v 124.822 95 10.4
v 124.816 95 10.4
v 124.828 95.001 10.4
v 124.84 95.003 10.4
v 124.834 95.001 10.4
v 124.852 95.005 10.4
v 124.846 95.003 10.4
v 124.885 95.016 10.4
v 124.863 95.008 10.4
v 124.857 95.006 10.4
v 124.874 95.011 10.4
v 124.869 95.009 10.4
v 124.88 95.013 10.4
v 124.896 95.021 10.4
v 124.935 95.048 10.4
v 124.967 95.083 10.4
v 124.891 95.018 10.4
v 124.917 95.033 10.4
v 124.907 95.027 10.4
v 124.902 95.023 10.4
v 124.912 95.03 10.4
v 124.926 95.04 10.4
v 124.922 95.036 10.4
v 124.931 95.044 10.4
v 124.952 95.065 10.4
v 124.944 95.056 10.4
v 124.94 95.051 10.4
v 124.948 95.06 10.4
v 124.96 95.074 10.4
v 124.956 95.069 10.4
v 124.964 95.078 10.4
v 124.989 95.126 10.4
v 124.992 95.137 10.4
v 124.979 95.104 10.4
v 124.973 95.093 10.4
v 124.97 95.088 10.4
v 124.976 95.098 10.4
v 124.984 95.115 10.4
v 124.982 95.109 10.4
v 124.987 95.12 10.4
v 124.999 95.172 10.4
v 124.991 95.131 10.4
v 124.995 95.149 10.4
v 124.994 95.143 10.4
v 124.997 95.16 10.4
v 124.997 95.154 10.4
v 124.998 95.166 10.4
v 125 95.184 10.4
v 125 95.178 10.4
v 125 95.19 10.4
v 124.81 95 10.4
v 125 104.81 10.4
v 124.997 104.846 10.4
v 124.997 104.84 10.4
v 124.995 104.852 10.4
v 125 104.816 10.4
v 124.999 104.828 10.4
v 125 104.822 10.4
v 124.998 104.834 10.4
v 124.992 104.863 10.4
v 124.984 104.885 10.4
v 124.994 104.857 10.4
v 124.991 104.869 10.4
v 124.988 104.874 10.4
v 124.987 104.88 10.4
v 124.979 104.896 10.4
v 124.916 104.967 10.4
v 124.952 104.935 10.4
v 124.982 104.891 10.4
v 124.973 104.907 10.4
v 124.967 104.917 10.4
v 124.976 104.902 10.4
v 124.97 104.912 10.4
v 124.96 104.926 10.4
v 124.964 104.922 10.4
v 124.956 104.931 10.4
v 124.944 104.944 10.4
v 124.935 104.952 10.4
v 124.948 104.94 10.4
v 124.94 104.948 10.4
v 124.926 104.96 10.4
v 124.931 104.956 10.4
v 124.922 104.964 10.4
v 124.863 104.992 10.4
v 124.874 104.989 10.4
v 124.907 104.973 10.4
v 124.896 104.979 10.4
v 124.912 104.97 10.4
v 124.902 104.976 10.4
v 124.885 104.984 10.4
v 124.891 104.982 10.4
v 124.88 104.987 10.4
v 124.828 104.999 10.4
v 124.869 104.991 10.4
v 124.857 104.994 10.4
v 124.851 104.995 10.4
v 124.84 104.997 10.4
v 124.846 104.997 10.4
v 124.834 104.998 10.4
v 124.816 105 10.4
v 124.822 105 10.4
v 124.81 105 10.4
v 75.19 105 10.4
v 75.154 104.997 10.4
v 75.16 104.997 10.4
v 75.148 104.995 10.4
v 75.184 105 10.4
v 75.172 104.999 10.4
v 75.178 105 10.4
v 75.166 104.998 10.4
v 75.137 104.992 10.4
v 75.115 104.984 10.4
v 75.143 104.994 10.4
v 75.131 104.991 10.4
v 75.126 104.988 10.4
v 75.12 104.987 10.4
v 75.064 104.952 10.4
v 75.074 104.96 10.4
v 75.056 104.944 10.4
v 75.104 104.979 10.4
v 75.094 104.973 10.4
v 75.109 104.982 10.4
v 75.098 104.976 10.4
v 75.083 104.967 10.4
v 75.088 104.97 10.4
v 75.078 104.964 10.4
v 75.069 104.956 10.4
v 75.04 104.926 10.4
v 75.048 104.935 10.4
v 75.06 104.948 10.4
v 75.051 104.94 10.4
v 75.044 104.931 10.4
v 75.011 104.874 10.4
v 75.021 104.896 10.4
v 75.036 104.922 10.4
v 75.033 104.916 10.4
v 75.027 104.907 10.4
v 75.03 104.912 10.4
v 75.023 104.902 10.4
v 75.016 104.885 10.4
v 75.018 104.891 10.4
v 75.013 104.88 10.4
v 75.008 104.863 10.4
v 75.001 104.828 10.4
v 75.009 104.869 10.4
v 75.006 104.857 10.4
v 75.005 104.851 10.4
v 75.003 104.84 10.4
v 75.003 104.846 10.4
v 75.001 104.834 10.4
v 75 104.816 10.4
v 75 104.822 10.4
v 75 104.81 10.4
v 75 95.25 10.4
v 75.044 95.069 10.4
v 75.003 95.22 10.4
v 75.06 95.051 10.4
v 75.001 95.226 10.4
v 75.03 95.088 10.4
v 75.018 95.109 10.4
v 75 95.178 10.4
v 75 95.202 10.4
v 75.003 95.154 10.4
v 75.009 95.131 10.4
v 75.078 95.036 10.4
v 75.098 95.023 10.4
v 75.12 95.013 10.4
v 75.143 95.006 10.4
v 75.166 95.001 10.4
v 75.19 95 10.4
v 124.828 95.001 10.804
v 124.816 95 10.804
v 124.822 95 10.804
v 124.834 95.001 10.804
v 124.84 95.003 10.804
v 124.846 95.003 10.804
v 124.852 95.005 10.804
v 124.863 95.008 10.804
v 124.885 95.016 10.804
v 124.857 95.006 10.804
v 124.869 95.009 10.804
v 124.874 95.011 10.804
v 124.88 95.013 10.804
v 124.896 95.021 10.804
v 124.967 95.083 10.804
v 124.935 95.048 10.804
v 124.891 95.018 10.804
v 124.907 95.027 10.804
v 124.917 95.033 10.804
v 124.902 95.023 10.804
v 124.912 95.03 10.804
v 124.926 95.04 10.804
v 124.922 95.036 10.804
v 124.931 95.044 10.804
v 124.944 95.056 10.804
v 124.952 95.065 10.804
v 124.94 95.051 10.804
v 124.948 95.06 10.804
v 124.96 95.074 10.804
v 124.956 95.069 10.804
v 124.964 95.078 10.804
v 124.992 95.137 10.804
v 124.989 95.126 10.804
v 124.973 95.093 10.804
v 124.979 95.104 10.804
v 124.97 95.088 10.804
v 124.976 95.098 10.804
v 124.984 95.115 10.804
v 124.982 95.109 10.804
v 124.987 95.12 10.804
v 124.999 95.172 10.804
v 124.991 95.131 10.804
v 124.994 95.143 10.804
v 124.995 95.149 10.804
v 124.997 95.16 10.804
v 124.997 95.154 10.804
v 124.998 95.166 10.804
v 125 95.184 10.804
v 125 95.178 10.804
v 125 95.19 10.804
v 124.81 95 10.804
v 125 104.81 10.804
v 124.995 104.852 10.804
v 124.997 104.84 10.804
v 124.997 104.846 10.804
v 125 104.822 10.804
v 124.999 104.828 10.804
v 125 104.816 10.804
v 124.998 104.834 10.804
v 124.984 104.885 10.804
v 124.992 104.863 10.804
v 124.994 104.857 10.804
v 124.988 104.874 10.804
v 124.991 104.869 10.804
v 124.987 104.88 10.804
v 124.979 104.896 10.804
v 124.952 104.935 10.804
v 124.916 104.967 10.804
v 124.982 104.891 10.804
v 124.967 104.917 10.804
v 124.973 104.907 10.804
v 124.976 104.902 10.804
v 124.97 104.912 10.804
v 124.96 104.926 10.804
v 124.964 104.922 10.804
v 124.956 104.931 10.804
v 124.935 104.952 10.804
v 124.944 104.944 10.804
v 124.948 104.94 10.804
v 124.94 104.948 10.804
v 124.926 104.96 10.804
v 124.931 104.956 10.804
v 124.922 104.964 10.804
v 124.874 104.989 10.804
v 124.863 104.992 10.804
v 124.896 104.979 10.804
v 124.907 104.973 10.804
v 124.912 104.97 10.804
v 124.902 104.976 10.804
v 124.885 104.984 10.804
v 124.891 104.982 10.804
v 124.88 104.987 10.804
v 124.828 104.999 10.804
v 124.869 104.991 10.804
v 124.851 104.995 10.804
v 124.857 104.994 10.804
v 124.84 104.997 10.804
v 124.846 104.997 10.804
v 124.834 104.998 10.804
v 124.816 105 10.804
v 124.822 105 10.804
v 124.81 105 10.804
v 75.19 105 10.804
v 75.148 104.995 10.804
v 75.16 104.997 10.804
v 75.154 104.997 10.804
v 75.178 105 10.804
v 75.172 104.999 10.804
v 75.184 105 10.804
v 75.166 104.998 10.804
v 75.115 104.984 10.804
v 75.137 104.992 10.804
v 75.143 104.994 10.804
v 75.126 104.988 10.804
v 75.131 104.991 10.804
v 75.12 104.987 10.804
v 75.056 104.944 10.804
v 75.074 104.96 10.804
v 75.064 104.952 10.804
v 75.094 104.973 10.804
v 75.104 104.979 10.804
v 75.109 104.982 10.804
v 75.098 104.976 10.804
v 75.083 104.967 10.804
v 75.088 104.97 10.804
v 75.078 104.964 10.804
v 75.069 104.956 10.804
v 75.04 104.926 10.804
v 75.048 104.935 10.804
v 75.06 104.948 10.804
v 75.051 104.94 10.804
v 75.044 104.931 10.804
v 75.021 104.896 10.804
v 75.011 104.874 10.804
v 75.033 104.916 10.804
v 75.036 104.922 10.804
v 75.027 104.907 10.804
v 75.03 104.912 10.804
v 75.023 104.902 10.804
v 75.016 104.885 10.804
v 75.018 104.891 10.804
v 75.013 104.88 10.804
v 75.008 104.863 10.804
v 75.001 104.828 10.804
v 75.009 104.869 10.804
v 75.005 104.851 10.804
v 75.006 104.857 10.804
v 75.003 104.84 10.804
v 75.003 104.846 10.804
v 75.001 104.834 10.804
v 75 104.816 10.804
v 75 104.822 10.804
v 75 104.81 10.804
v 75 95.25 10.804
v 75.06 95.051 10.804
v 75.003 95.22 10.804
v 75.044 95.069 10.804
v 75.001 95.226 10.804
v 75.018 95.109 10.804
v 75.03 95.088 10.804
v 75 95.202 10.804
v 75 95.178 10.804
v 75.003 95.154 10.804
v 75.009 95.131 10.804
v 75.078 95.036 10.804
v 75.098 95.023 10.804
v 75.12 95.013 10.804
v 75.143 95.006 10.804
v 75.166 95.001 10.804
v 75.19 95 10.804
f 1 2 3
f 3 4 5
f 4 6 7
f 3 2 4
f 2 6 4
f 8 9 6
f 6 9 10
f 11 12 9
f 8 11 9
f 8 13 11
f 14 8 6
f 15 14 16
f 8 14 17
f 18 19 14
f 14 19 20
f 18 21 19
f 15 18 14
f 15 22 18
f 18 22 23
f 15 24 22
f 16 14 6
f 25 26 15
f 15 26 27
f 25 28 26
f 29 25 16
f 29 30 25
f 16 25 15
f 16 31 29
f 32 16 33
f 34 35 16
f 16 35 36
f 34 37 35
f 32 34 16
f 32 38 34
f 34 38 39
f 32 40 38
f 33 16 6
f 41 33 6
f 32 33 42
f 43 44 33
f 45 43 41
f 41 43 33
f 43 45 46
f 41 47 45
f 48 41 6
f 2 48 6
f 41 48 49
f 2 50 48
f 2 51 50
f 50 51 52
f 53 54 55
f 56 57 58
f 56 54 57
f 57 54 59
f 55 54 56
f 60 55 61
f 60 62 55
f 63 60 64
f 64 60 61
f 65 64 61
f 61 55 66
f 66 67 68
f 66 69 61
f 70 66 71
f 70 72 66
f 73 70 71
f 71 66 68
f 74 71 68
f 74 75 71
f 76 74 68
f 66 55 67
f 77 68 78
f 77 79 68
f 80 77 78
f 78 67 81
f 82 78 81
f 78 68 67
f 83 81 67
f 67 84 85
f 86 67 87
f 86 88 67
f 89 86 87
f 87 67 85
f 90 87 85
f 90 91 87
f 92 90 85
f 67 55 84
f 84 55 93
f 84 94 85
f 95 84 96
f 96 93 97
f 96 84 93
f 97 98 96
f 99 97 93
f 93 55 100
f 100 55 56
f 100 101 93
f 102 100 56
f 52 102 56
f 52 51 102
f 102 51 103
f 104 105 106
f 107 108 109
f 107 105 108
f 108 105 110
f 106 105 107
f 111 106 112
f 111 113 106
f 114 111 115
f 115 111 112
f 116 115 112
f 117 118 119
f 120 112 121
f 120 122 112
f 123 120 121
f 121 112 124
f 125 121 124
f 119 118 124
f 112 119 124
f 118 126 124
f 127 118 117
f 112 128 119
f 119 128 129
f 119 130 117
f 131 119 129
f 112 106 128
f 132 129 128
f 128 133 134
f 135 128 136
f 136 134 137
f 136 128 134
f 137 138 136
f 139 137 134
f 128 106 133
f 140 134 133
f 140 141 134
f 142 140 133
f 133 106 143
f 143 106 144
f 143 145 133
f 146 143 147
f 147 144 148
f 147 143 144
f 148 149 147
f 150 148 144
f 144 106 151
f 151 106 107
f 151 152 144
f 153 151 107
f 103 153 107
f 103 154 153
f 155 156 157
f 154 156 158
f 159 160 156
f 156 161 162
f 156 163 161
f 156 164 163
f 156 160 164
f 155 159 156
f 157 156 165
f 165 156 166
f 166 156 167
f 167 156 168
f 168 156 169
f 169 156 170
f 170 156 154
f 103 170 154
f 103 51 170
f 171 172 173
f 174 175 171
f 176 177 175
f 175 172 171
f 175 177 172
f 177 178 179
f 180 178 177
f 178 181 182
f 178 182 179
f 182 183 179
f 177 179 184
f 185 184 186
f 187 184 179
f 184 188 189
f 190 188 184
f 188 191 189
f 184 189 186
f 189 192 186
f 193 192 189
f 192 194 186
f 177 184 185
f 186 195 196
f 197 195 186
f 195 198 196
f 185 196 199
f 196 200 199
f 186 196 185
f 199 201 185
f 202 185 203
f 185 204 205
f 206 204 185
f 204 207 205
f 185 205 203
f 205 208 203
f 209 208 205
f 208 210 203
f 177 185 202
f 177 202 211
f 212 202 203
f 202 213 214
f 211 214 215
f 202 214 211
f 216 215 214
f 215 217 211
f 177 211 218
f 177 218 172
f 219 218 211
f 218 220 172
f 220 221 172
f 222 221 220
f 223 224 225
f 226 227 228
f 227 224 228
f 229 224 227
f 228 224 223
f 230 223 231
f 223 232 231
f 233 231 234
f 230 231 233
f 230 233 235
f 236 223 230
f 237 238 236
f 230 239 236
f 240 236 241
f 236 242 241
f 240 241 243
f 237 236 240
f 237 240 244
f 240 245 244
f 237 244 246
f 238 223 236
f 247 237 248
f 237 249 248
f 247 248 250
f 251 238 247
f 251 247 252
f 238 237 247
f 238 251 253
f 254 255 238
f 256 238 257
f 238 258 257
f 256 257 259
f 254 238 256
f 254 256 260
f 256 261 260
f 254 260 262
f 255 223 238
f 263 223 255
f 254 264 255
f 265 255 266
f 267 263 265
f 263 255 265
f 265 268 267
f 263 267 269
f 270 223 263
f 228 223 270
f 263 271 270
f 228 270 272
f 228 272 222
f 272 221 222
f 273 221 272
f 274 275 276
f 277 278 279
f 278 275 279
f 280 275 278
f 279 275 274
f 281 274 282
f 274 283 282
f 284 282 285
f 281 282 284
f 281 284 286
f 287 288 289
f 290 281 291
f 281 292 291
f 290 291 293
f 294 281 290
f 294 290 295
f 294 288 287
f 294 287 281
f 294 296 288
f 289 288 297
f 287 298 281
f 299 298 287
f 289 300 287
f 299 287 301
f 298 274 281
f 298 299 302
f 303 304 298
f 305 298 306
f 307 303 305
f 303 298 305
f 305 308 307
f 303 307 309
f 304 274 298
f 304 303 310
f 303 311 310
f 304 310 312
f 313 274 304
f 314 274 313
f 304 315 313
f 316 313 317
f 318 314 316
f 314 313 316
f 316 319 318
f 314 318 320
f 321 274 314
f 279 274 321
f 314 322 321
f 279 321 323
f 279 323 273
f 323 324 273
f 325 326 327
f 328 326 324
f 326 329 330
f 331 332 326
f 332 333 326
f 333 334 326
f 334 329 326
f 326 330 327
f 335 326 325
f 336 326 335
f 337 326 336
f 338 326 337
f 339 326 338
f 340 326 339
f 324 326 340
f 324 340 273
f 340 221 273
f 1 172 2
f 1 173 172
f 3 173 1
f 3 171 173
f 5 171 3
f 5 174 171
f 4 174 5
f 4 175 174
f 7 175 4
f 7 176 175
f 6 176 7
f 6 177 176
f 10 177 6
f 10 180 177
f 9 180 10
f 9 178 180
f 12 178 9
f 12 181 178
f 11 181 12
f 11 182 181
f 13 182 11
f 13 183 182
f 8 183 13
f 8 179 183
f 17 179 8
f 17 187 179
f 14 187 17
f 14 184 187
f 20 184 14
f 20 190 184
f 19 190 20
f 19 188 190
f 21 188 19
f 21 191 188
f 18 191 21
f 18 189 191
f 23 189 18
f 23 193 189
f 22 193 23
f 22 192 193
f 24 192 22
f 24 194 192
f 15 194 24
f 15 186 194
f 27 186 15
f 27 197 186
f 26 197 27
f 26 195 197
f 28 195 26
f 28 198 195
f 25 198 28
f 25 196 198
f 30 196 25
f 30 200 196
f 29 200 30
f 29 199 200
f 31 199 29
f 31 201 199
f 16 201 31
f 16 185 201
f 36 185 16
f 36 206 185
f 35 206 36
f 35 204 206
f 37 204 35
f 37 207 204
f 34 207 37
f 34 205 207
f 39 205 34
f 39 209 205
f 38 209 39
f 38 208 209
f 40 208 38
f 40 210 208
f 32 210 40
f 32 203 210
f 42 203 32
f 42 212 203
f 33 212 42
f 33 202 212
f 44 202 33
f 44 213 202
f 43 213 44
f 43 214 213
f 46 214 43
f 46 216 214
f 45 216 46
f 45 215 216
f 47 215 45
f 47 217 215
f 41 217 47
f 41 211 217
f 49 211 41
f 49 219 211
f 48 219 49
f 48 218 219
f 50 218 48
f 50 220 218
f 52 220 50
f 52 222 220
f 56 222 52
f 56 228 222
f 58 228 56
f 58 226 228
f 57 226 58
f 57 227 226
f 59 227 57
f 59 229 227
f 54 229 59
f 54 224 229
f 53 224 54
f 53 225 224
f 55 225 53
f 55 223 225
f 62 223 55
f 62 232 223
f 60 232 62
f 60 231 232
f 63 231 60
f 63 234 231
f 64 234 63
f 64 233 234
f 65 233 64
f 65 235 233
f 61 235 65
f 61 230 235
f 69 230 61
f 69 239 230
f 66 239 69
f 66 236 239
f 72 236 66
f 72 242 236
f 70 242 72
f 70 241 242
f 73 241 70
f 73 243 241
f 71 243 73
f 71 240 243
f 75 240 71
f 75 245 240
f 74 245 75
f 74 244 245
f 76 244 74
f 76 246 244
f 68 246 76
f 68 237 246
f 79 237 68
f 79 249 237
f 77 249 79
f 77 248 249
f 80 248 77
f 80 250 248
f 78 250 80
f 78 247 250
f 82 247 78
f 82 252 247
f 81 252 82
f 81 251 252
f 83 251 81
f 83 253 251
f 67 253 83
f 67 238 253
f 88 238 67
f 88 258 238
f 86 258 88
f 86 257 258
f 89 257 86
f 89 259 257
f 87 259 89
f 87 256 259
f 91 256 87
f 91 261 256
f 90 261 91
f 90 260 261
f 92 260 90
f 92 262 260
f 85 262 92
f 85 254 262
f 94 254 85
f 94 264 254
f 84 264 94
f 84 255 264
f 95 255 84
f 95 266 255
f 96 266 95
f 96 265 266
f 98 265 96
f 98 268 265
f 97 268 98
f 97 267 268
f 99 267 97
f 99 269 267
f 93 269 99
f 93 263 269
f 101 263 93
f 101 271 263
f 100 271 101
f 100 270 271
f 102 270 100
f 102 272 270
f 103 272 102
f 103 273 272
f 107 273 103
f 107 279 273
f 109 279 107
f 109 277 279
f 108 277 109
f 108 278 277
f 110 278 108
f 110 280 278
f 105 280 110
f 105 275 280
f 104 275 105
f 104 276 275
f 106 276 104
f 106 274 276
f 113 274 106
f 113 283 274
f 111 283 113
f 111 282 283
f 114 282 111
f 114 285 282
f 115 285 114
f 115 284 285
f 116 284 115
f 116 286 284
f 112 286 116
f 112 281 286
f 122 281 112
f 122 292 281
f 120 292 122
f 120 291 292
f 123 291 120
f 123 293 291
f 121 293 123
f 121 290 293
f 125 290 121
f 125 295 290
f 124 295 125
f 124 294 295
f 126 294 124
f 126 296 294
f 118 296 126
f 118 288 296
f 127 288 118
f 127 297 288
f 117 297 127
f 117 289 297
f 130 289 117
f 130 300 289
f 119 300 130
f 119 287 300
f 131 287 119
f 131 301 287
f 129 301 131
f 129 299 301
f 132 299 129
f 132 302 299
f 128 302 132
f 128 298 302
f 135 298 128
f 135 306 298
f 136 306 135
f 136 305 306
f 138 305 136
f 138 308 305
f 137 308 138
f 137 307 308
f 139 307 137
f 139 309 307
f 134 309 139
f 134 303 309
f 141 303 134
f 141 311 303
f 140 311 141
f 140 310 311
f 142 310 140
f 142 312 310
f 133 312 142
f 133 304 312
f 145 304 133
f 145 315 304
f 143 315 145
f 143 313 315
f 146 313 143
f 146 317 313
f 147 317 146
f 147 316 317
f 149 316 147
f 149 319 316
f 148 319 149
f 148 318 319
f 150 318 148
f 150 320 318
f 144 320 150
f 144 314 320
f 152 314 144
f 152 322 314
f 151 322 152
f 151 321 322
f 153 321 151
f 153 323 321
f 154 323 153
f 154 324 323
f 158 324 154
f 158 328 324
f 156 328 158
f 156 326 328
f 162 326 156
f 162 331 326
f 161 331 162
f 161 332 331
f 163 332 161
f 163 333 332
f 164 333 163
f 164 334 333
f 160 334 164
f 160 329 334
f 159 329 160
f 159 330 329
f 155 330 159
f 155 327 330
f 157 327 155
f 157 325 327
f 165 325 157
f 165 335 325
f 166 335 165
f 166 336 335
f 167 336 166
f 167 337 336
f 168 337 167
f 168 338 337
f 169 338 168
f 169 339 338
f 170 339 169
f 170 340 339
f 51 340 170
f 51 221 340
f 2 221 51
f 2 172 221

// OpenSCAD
module drawBasicShape(x1, y1, x2, y2, width)
{
	length = sqrt((x1-x2)*(x1-x2) + (y1-y2)*(y1-y2));
	if (width!=0.0) {
		square(size = [width, length], center = false);
		translate([width/2.0, 0, 0]) circle(d=width);
		translate([width/2.0, length, 0]) circle(d=width);
	}
}

module translateAndRotate(x1, y1, x2, y2, width)
{
	if (width != 0.0) {
		angle = atan((y2-y1)/(x2-x1)) +270;
		if (x2>=x1) {
			translate([x1, y1, 0.0]) rotate([0.0, 0.0, angle]) translate([-width/2.0, 0.0, 0.0]) scale([1.0, 1.0, 1.0]) drawBasicShape(x1, y1, x2, y2, width);
		}
		else {
			translate([x1, y1, 0.0]) rotate([0.0, 0.0, angle+180]) translate([-width/2.0, 0.0, 0.0]) scale([1.0, 1.0, 1.0]) drawBasicShape(x1, y1, x2, y2, width);		}
	}
}

$fn=50;

points25 = [
[75.77800000, 95.77800000, 0.00000000],
[124.22200000, 95.77800000, 0.37999548],
[124.22200000, 104.22200000, 0.37997788],
[75.77800000, 104.22200000, 0.37999672],
[75.77800000, 95.83800000, 0.37997423],
[75.48400000, 95.48400000, 0.00000000],
[124.51600000, 95.48400000, 0.37999868],
[124.51600000, 104.51600000, 0.37998977],
[75.48400000, 104.51600000, 0.37999746],
[75.48400000, 95.54400000, 0.37999314],
[75.19000000, 95.19000000, 0.00000000],
[124.81000000, 95.19000000, 0.37999939],
[124.81000000, 104.81000000, 0.38000021],
[75.19000000, 104.81000000, 0.37999939],
[75.19000000, 95.25000000, 0.38000344],
[75.53600000, 95.39000000, 0.00000000],
[76.11100000, 95.94600000, 0.00000000],
[75.94600000, 96.11100000, 0.37961375],
[75.94600000, 96.52800000, 0.38001190],
[76.52800000, 95.94600000, 0.37989934],
[76.94500000, 95.94600000, 0.38001190],
[75.94600000, 96.94500000, 0.37998907],
[75.94600000, 97.36200000, 0.38001190],
[77.36200000, 95.94600000, 0.37999592],
[77.77900000, 95.94600000, 0.38001190],
[75.94600000, 97.77900000, 0.37999966],
[75.94600000, 98.19600000, 0.38001190],
[78.19600000, 95.94600000, 0.38002091],
[78.61300000, 95.94600000, 0.38001190],
[75.94600000, 98.61300000, 0.38001957],
[75.94600000, 99.03000000, 0.38001190],
[79.03000000, 95.94600000, 0.38001859],
[79.44700000, 95.94600000, 0.38001190],
[75.94600000, 99.44700000, 0.38002999],
[75.94600000, 99.86400000, 0.38001190],
[79.86400000, 95.94600000, 0.38001726],
[80.28100000, 95.94600000, 0.38015610],
[75.94600000, 100.28100000, 0.38002660],
[75.94600000, 100.69800000, 0.38001190],
[80.69800000, 95.94600000, 0.38002534],
[81.11500000, 95.94600000, 0.38015610],
[75.94600000, 101.11500000, 0.38002430],
[75.94600000, 101.53300000, 0.37945200],
[81.53300000, 95.94600000, 0.37997836],
[81.95000000, 95.94600000, 0.38001190],
[75.94600000, 101.95000000, 0.37998072],
[75.94600000, 102.36700000, 0.38001190],
[82.36700000, 95.94600000, 0.37998939],
[82.78400000, 95.94600000, 0.38001190],
[75.94600000, 102.78400000, 0.37999079],
[75.94600000, 103.20100000, 0.38001190],
[83.20100000, 95.94600000, 0.37999789],
[83.61800000, 95.94600000, 0.38001190],
[75.94600000, 103.61800000, 0.37999868],
[75.95600000, 104.02400000, 0.38048727],
[84.03500000, 95.94600000, 0.37999749],
[84.45200000, 95.94600000, 0.38015610],
[76.34400000, 104.05400000, 0.38000229],
[76.76100000, 104.05400000, 0.38001190],
[84.86900000, 95.94600000, 0.38000754],
[85.28600000, 95.94600000, 0.38001190],
[77.17800000, 104.05400000, 0.38000229],
[77.59500000, 104.05400000, 0.38001190],
[85.70300000, 95.94600000, 0.38000754],
[86.12000000, 95.94600000, 0.38001190],
[78.01200000, 104.05400000, 0.38000229],
[78.42900000, 104.05400000, 0.38015610],
[86.53700000, 95.94600000, 0.38000229],
[86.95400000, 95.94600000, 0.38001190],
[78.84600000, 104.05400000, 0.38000229],
[79.26300000, 104.05400000, 0.38015610],
[87.37100000, 95.94600000, 0.38000229],
[87.78900000, 95.94600000, 0.37930814],
[79.68000000, 104.05400000, 0.37998940],
[80.09700000, 104.05400000, 0.38001190],
[88.20600000, 95.94600000, 0.37998415],
[88.62300000, 95.94600000, 0.38015610],
[80.51500000, 104.05400000, 0.38000229],
[80.93200000, 104.05400000, 0.38001190],
[89.04000000, 95.94600000, 0.38000229],
[89.45700000, 95.94600000, 0.38015610],
[81.34900000, 104.05400000, 0.38000229],
[81.76600000, 104.05400000, 0.38001190],
[89.87400000, 95.94600000, 0.38000754],
[90.29100000, 95.94600000, 0.38001190],
[82.18300000, 104.05400000, 0.38000229],
[82.60000000, 104.05400000, 0.38001190],
[90.70800000, 95.94600000, 0.38000754],
[91.12500000, 95.94600000, 0.38001190],
[83.01700000, 104.05400000, 0.38000229],
[83.43400000, 104.05400000, 0.38015610],
[91.54200000, 95.94600000, 0.38000229],
[91.95900000, 95.94600000, 0.38001190],
[83.85100000, 104.05400000, 0.38000754],
[84.26800000, 104.05400000, 0.38001190],
[92.37600000, 95.94600000, 0.38000229],
[92.79300000, 95.94600000, 0.38001190],
[84.68500000, 104.05400000, 0.38000754],
[85.10200000, 104.05400000, 0.38001190],
[93.21000000, 95.94600000, 0.38000229],
[93.62700000, 95.94600000, 0.38015610],
[85.51900000, 104.05400000, 0.38000229],
[85.93600000, 104.05400000, 0.38001190],
[94.04400000, 95.94600000, 0.38000754],
[94.46200000, 95.94600000, 0.37930814],
[86.35300000, 104.05400000, 0.37998415],
[86.77000000, 104.05400000, 0.38001190],
[94.87900000, 95.94600000, 0.37998940],
[95.29600000, 95.94600000, 0.38001190],
[87.18800000, 104.05400000, 0.38000229],
[87.60500000, 104.05400000, 0.38015610],
[95.71300000, 95.94600000, 0.38000229],
[96.13000000, 95.94600000, 0.38001190],
[88.02200000, 104.05400000, 0.38000754],
[88.43900000, 104.05400000, 0.38001190],
[96.54700000, 95.94600000, 0.38000229],
[96.96400000, 95.94600000, 0.38001190],
[88.85600000, 104.05400000, 0.38000754],
[89.27300000, 104.05400000, 0.38001190],
[97.38100000, 95.94600000, 0.38000229],
[97.79800000, 95.94600000, 0.38015610],
[89.69000000, 104.05400000, 0.38000229],
[90.10700000, 104.05400000, 0.38001190],
[98.21500000, 95.94600000, 0.38000754],
[98.63200000, 95.94600000, 0.38001190],
[90.52400000, 104.05400000, 0.38000229],
[90.94100000, 104.05400000, 0.38001190],
[99.04900000, 95.94600000, 0.38000754],
[99.46600000, 95.94600000, 0.38001190],
[91.35800000, 104.05400000, 0.38000229],
[91.77500000, 104.05400000, 0.38015610],
[99.88300000, 95.94600000, 0.38000229],
[100.30000000, 95.94600000, 0.38001190],
[92.19200000, 104.05400000, 0.38000754],
[92.60900000, 104.05400000, 0.38001190],
[100.71800000, 95.94600000, 0.37998415],
[101.13500000, 95.94600000, 0.38001190],
[93.02600000, 104.05400000, 0.37998940],
[93.44400000, 104.05400000, 0.37930814],
[101.55200000, 95.94600000, 0.38000229],
[101.96900000, 95.94600000, 0.38015610],
[93.86100000, 104.05400000, 0.38000229],
[94.27800000, 104.05400000, 0.38001190],
[102.38600000, 95.94600000, 0.38000754],
[102.80300000, 95.94600000, 0.38001190],
[94.69500000, 104.05400000, 0.38000229],
[95.11200000, 104.05400000, 0.38001190],
[103.22000000, 95.94600000, 0.38000754],
[103.63700000, 95.94600000, 0.38001190],
[95.52900000, 104.05400000, 0.38000229],
[95.94600000, 104.05400000, 0.38015610],
[104.05400000, 95.94600000, 0.38000229],
[104.47100000, 95.94600000, 0.38001190],
[96.36300000, 104.05400000, 0.38000754],
[96.78000000, 104.05400000, 0.38001190],
[104.88800000, 95.94600000, 0.38000229],
[105.30500000, 95.94600000, 0.38001190],
[97.19700000, 104.05400000, 0.38000754],
[97.61400000, 104.05400000, 0.38001190],
[105.72200000, 95.94600000, 0.38000229],
[106.13900000, 95.94600000, 0.38015610],
[98.03100000, 104.05400000, 0.38000229],
[98.44800000, 104.05400000, 0.38001190],
[106.55600000, 95.94600000, 0.38000754],
[106.97300000, 95.94600000, 0.38001190],
[98.86500000, 104.05400000, 0.38000229],
[99.28200000, 104.05400000, 0.38001190],
[107.39100000, 95.94600000, 0.37998940],
[107.80800000, 95.94600000, 0.38001190],
[99.69900000, 104.05400000, 0.37998415],
[100.11700000, 104.05400000, 0.37945200],
[108.22500000, 95.94600000, 0.38000229],
[108.64200000, 95.94600000, 0.38001190],
[100.53400000, 104.05400000, 0.38000754],
[100.95100000, 104.05400000, 0.38001190],
[109.05900000, 95.94600000, 0.38000229],
[109.47600000, 95.94600000, 0.38001190],
[101.36800000, 104.05400000, 0.38000754],
[101.78500000, 104.05400000, 0.38001190],
[109.89300000, 95.94600000, 0.38000229],
[110.31000000, 95.94600000, 0.38015610],
[102.20200000, 104.05400000, 0.38000229],
[102.61900000, 104.05400000, 0.38001190],
[110.72700000, 95.94600000, 0.38000754],
[111.14400000, 95.94600000, 0.38001190],
[103.03600000, 104.05400000, 0.38000229],
[103.45300000, 104.05400000, 0.38001190],
[111.56100000, 95.94600000, 0.38000754],
[111.97800000, 95.94600000, 0.38001190],
[103.87000000, 104.05400000, 0.38000229],
[104.28700000, 104.05400000, 0.38015610],
[112.39500000, 95.94600000, 0.38000229],
[112.81200000, 95.94600000, 0.38001190],
[104.70400000, 104.05400000, 0.38000754],
[105.12100000, 104.05400000, 0.38001190],
[113.22900000, 95.94600000, 0.38000229],
[113.64700000, 95.94600000, 0.37930814],
[105.53800000, 104.05400000, 0.37998940],
[105.95500000, 104.05400000, 0.38001190],
[114.06400000, 95.94600000, 0.37998415],
[114.48100000, 95.94600000, 0.38015610],
[106.37300000, 104.05400000, 0.38000229],
[106.79000000, 104.05400000, 0.38001190],
[114.89800000, 95.94600000, 0.38000754],
[115.31500000, 95.94600000, 0.38001190],
[107.20700000, 104.05400000, 0.38000229],
[107.62400000, 104.05400000, 0.38001190],
[115.73200000, 95.94600000, 0.38000754],
[116.14900000, 95.94600000, 0.38001190],
[108.04100000, 104.05400000, 0.38000229],
[108.45800000, 104.05400000, 0.38015610],
[116.56600000, 95.94600000, 0.38000229],
[116.98300000, 95.94600000, 0.38001190],
[108.87500000, 104.05400000, 0.38000754],
[109.29200000, 104.05400000, 0.38001190],
[117.40000000, 95.94600000, 0.38000229],
[117.81700000, 95.94600000, 0.38001190],
[109.70900000, 104.05400000, 0.38000754],
[110.12600000, 104.05400000, 0.38001190],
[118.23400000, 95.94600000, 0.38000229],
[118.65100000, 95.94600000, 0.38015610],
[110.54300000, 104.05400000, 0.38000229],
[110.96000000, 104.05400000, 0.38001190],
[119.06800000, 95.94600000, 0.38000229],
[119.48500000, 95.94600000, 0.38015610],
[111.37700000, 104.05400000, 0.38000229],
[111.79400000, 104.05400000, 0.38001190],
[119.90200000, 95.94600000, 0.38000754],
[120.32000000, 95.94600000, 0.37930814],
[112.21100000, 104.05400000, 0.37998415],
[112.62900000, 104.05400000, 0.37945200],
[120.73700000, 95.94600000, 0.38000229],
[121.15400000, 95.94600000, 0.38001190],
[113.04600000, 104.05400000, 0.38000229],
[113.46300000, 104.05400000, 0.38015610],
[121.57100000, 95.94600000, 0.38000229],
[121.98800000, 95.94600000, 0.38001190],
[113.88000000, 104.05400000, 0.38000754],
[114.29700000, 104.05400000, 0.38001190],
[122.40500000, 95.94600000, 0.38000229],
[122.82200000, 95.94600000, 0.38015610],
[114.71400000, 104.05400000, 0.38000229],
[115.13100000, 104.05400000, 0.38001190],
[123.23900000, 95.94600000, 0.38000229],
[123.65600000, 95.94600000, 0.38015610],
[115.54800000, 104.05400000, 0.38000229],
[115.96500000, 104.05400000, 0.38001190],
[124.04400000, 95.97500000, 0.37998455],
[124.05400000, 96.38200000, 0.37976376],
[116.38200000, 104.05400000, 0.37999868],
[116.79900000, 104.05400000, 0.38001190],
[124.05400000, 96.79900000, 0.37999789],
[124.05400000, 97.21600000, 0.38001190],
[117.21600000, 104.05400000, 0.37999701],
[117.63300000, 104.05400000, 0.38001190],
[124.05400000, 97.63300000, 0.37998939],
[124.05400000, 98.05000000, 0.38001190],
[118.05000000, 104.05400000, 0.37998780],
[118.46700000, 104.05400000, 0.38001190],
[124.05400000, 98.46700000, 0.37997836],
[124.05400000, 98.88400000, 0.38015610],
[118.88400000, 104.05400000, 0.37997562],
[119.30200000, 104.05400000, 0.37930814],
[124.05400000, 99.30200000, 0.38003429],
[124.05400000, 99.71900000, 0.38001190],
[119.71900000, 104.05400000, 0.38002660],
[120.13600000, 104.05400000, 0.38001190],
[124.05400000, 100.13600000, 0.38003896],
[124.05400000, 100.55300000, 0.38001190],
[120.55300000, 104.05400000, 0.38001785],
[120.97000000, 104.05400000, 0.38015610],
[124.05400000, 100.97000000, 0.38001859],
[124.05400000, 101.38700000, 0.38001190],
[121.38700000, 104.05400000, 0.38001957],
[121.80400000, 104.05400000, 0.38015610],
[124.05400000, 101.80400000, 0.38000201],
[124.05400000, 102.22100000, 0.38015610],
[122.22100000, 104.05400000, 0.37999966],
[122.63800000, 104.05400000, 0.38001190],
[124.05400000, 102.63800000, 0.37999592],
[124.05400000, 103.05500000, 0.38015610],
[123.05500000, 104.05400000, 0.37994651],
[123.47200000, 104.05400000, 0.38015610],
[124.05400000, 103.47200000, 0.37989934],
[124.05400000, 103.88900000, 0.38001190],
[123.88900000, 104.05400000, 0.37987144],
];

translate([0.0, 0.0, 10.40000000]) {
	linear_extrude(height = 0.40400000, center = false, convexity = 10, twist = 0) {
		union() {
			for( i=[0:len(points25)-2] ){ 
				x1 = points25[i][0];
				y1 = points25[i][1];
				x2 = points25[i+1][0];
				y2 = points25[i+1][1];
				width = points25[i+1][2];
				translateAndRotate(x1, y1, x2, y2, width);
			}
		}
	}
}
